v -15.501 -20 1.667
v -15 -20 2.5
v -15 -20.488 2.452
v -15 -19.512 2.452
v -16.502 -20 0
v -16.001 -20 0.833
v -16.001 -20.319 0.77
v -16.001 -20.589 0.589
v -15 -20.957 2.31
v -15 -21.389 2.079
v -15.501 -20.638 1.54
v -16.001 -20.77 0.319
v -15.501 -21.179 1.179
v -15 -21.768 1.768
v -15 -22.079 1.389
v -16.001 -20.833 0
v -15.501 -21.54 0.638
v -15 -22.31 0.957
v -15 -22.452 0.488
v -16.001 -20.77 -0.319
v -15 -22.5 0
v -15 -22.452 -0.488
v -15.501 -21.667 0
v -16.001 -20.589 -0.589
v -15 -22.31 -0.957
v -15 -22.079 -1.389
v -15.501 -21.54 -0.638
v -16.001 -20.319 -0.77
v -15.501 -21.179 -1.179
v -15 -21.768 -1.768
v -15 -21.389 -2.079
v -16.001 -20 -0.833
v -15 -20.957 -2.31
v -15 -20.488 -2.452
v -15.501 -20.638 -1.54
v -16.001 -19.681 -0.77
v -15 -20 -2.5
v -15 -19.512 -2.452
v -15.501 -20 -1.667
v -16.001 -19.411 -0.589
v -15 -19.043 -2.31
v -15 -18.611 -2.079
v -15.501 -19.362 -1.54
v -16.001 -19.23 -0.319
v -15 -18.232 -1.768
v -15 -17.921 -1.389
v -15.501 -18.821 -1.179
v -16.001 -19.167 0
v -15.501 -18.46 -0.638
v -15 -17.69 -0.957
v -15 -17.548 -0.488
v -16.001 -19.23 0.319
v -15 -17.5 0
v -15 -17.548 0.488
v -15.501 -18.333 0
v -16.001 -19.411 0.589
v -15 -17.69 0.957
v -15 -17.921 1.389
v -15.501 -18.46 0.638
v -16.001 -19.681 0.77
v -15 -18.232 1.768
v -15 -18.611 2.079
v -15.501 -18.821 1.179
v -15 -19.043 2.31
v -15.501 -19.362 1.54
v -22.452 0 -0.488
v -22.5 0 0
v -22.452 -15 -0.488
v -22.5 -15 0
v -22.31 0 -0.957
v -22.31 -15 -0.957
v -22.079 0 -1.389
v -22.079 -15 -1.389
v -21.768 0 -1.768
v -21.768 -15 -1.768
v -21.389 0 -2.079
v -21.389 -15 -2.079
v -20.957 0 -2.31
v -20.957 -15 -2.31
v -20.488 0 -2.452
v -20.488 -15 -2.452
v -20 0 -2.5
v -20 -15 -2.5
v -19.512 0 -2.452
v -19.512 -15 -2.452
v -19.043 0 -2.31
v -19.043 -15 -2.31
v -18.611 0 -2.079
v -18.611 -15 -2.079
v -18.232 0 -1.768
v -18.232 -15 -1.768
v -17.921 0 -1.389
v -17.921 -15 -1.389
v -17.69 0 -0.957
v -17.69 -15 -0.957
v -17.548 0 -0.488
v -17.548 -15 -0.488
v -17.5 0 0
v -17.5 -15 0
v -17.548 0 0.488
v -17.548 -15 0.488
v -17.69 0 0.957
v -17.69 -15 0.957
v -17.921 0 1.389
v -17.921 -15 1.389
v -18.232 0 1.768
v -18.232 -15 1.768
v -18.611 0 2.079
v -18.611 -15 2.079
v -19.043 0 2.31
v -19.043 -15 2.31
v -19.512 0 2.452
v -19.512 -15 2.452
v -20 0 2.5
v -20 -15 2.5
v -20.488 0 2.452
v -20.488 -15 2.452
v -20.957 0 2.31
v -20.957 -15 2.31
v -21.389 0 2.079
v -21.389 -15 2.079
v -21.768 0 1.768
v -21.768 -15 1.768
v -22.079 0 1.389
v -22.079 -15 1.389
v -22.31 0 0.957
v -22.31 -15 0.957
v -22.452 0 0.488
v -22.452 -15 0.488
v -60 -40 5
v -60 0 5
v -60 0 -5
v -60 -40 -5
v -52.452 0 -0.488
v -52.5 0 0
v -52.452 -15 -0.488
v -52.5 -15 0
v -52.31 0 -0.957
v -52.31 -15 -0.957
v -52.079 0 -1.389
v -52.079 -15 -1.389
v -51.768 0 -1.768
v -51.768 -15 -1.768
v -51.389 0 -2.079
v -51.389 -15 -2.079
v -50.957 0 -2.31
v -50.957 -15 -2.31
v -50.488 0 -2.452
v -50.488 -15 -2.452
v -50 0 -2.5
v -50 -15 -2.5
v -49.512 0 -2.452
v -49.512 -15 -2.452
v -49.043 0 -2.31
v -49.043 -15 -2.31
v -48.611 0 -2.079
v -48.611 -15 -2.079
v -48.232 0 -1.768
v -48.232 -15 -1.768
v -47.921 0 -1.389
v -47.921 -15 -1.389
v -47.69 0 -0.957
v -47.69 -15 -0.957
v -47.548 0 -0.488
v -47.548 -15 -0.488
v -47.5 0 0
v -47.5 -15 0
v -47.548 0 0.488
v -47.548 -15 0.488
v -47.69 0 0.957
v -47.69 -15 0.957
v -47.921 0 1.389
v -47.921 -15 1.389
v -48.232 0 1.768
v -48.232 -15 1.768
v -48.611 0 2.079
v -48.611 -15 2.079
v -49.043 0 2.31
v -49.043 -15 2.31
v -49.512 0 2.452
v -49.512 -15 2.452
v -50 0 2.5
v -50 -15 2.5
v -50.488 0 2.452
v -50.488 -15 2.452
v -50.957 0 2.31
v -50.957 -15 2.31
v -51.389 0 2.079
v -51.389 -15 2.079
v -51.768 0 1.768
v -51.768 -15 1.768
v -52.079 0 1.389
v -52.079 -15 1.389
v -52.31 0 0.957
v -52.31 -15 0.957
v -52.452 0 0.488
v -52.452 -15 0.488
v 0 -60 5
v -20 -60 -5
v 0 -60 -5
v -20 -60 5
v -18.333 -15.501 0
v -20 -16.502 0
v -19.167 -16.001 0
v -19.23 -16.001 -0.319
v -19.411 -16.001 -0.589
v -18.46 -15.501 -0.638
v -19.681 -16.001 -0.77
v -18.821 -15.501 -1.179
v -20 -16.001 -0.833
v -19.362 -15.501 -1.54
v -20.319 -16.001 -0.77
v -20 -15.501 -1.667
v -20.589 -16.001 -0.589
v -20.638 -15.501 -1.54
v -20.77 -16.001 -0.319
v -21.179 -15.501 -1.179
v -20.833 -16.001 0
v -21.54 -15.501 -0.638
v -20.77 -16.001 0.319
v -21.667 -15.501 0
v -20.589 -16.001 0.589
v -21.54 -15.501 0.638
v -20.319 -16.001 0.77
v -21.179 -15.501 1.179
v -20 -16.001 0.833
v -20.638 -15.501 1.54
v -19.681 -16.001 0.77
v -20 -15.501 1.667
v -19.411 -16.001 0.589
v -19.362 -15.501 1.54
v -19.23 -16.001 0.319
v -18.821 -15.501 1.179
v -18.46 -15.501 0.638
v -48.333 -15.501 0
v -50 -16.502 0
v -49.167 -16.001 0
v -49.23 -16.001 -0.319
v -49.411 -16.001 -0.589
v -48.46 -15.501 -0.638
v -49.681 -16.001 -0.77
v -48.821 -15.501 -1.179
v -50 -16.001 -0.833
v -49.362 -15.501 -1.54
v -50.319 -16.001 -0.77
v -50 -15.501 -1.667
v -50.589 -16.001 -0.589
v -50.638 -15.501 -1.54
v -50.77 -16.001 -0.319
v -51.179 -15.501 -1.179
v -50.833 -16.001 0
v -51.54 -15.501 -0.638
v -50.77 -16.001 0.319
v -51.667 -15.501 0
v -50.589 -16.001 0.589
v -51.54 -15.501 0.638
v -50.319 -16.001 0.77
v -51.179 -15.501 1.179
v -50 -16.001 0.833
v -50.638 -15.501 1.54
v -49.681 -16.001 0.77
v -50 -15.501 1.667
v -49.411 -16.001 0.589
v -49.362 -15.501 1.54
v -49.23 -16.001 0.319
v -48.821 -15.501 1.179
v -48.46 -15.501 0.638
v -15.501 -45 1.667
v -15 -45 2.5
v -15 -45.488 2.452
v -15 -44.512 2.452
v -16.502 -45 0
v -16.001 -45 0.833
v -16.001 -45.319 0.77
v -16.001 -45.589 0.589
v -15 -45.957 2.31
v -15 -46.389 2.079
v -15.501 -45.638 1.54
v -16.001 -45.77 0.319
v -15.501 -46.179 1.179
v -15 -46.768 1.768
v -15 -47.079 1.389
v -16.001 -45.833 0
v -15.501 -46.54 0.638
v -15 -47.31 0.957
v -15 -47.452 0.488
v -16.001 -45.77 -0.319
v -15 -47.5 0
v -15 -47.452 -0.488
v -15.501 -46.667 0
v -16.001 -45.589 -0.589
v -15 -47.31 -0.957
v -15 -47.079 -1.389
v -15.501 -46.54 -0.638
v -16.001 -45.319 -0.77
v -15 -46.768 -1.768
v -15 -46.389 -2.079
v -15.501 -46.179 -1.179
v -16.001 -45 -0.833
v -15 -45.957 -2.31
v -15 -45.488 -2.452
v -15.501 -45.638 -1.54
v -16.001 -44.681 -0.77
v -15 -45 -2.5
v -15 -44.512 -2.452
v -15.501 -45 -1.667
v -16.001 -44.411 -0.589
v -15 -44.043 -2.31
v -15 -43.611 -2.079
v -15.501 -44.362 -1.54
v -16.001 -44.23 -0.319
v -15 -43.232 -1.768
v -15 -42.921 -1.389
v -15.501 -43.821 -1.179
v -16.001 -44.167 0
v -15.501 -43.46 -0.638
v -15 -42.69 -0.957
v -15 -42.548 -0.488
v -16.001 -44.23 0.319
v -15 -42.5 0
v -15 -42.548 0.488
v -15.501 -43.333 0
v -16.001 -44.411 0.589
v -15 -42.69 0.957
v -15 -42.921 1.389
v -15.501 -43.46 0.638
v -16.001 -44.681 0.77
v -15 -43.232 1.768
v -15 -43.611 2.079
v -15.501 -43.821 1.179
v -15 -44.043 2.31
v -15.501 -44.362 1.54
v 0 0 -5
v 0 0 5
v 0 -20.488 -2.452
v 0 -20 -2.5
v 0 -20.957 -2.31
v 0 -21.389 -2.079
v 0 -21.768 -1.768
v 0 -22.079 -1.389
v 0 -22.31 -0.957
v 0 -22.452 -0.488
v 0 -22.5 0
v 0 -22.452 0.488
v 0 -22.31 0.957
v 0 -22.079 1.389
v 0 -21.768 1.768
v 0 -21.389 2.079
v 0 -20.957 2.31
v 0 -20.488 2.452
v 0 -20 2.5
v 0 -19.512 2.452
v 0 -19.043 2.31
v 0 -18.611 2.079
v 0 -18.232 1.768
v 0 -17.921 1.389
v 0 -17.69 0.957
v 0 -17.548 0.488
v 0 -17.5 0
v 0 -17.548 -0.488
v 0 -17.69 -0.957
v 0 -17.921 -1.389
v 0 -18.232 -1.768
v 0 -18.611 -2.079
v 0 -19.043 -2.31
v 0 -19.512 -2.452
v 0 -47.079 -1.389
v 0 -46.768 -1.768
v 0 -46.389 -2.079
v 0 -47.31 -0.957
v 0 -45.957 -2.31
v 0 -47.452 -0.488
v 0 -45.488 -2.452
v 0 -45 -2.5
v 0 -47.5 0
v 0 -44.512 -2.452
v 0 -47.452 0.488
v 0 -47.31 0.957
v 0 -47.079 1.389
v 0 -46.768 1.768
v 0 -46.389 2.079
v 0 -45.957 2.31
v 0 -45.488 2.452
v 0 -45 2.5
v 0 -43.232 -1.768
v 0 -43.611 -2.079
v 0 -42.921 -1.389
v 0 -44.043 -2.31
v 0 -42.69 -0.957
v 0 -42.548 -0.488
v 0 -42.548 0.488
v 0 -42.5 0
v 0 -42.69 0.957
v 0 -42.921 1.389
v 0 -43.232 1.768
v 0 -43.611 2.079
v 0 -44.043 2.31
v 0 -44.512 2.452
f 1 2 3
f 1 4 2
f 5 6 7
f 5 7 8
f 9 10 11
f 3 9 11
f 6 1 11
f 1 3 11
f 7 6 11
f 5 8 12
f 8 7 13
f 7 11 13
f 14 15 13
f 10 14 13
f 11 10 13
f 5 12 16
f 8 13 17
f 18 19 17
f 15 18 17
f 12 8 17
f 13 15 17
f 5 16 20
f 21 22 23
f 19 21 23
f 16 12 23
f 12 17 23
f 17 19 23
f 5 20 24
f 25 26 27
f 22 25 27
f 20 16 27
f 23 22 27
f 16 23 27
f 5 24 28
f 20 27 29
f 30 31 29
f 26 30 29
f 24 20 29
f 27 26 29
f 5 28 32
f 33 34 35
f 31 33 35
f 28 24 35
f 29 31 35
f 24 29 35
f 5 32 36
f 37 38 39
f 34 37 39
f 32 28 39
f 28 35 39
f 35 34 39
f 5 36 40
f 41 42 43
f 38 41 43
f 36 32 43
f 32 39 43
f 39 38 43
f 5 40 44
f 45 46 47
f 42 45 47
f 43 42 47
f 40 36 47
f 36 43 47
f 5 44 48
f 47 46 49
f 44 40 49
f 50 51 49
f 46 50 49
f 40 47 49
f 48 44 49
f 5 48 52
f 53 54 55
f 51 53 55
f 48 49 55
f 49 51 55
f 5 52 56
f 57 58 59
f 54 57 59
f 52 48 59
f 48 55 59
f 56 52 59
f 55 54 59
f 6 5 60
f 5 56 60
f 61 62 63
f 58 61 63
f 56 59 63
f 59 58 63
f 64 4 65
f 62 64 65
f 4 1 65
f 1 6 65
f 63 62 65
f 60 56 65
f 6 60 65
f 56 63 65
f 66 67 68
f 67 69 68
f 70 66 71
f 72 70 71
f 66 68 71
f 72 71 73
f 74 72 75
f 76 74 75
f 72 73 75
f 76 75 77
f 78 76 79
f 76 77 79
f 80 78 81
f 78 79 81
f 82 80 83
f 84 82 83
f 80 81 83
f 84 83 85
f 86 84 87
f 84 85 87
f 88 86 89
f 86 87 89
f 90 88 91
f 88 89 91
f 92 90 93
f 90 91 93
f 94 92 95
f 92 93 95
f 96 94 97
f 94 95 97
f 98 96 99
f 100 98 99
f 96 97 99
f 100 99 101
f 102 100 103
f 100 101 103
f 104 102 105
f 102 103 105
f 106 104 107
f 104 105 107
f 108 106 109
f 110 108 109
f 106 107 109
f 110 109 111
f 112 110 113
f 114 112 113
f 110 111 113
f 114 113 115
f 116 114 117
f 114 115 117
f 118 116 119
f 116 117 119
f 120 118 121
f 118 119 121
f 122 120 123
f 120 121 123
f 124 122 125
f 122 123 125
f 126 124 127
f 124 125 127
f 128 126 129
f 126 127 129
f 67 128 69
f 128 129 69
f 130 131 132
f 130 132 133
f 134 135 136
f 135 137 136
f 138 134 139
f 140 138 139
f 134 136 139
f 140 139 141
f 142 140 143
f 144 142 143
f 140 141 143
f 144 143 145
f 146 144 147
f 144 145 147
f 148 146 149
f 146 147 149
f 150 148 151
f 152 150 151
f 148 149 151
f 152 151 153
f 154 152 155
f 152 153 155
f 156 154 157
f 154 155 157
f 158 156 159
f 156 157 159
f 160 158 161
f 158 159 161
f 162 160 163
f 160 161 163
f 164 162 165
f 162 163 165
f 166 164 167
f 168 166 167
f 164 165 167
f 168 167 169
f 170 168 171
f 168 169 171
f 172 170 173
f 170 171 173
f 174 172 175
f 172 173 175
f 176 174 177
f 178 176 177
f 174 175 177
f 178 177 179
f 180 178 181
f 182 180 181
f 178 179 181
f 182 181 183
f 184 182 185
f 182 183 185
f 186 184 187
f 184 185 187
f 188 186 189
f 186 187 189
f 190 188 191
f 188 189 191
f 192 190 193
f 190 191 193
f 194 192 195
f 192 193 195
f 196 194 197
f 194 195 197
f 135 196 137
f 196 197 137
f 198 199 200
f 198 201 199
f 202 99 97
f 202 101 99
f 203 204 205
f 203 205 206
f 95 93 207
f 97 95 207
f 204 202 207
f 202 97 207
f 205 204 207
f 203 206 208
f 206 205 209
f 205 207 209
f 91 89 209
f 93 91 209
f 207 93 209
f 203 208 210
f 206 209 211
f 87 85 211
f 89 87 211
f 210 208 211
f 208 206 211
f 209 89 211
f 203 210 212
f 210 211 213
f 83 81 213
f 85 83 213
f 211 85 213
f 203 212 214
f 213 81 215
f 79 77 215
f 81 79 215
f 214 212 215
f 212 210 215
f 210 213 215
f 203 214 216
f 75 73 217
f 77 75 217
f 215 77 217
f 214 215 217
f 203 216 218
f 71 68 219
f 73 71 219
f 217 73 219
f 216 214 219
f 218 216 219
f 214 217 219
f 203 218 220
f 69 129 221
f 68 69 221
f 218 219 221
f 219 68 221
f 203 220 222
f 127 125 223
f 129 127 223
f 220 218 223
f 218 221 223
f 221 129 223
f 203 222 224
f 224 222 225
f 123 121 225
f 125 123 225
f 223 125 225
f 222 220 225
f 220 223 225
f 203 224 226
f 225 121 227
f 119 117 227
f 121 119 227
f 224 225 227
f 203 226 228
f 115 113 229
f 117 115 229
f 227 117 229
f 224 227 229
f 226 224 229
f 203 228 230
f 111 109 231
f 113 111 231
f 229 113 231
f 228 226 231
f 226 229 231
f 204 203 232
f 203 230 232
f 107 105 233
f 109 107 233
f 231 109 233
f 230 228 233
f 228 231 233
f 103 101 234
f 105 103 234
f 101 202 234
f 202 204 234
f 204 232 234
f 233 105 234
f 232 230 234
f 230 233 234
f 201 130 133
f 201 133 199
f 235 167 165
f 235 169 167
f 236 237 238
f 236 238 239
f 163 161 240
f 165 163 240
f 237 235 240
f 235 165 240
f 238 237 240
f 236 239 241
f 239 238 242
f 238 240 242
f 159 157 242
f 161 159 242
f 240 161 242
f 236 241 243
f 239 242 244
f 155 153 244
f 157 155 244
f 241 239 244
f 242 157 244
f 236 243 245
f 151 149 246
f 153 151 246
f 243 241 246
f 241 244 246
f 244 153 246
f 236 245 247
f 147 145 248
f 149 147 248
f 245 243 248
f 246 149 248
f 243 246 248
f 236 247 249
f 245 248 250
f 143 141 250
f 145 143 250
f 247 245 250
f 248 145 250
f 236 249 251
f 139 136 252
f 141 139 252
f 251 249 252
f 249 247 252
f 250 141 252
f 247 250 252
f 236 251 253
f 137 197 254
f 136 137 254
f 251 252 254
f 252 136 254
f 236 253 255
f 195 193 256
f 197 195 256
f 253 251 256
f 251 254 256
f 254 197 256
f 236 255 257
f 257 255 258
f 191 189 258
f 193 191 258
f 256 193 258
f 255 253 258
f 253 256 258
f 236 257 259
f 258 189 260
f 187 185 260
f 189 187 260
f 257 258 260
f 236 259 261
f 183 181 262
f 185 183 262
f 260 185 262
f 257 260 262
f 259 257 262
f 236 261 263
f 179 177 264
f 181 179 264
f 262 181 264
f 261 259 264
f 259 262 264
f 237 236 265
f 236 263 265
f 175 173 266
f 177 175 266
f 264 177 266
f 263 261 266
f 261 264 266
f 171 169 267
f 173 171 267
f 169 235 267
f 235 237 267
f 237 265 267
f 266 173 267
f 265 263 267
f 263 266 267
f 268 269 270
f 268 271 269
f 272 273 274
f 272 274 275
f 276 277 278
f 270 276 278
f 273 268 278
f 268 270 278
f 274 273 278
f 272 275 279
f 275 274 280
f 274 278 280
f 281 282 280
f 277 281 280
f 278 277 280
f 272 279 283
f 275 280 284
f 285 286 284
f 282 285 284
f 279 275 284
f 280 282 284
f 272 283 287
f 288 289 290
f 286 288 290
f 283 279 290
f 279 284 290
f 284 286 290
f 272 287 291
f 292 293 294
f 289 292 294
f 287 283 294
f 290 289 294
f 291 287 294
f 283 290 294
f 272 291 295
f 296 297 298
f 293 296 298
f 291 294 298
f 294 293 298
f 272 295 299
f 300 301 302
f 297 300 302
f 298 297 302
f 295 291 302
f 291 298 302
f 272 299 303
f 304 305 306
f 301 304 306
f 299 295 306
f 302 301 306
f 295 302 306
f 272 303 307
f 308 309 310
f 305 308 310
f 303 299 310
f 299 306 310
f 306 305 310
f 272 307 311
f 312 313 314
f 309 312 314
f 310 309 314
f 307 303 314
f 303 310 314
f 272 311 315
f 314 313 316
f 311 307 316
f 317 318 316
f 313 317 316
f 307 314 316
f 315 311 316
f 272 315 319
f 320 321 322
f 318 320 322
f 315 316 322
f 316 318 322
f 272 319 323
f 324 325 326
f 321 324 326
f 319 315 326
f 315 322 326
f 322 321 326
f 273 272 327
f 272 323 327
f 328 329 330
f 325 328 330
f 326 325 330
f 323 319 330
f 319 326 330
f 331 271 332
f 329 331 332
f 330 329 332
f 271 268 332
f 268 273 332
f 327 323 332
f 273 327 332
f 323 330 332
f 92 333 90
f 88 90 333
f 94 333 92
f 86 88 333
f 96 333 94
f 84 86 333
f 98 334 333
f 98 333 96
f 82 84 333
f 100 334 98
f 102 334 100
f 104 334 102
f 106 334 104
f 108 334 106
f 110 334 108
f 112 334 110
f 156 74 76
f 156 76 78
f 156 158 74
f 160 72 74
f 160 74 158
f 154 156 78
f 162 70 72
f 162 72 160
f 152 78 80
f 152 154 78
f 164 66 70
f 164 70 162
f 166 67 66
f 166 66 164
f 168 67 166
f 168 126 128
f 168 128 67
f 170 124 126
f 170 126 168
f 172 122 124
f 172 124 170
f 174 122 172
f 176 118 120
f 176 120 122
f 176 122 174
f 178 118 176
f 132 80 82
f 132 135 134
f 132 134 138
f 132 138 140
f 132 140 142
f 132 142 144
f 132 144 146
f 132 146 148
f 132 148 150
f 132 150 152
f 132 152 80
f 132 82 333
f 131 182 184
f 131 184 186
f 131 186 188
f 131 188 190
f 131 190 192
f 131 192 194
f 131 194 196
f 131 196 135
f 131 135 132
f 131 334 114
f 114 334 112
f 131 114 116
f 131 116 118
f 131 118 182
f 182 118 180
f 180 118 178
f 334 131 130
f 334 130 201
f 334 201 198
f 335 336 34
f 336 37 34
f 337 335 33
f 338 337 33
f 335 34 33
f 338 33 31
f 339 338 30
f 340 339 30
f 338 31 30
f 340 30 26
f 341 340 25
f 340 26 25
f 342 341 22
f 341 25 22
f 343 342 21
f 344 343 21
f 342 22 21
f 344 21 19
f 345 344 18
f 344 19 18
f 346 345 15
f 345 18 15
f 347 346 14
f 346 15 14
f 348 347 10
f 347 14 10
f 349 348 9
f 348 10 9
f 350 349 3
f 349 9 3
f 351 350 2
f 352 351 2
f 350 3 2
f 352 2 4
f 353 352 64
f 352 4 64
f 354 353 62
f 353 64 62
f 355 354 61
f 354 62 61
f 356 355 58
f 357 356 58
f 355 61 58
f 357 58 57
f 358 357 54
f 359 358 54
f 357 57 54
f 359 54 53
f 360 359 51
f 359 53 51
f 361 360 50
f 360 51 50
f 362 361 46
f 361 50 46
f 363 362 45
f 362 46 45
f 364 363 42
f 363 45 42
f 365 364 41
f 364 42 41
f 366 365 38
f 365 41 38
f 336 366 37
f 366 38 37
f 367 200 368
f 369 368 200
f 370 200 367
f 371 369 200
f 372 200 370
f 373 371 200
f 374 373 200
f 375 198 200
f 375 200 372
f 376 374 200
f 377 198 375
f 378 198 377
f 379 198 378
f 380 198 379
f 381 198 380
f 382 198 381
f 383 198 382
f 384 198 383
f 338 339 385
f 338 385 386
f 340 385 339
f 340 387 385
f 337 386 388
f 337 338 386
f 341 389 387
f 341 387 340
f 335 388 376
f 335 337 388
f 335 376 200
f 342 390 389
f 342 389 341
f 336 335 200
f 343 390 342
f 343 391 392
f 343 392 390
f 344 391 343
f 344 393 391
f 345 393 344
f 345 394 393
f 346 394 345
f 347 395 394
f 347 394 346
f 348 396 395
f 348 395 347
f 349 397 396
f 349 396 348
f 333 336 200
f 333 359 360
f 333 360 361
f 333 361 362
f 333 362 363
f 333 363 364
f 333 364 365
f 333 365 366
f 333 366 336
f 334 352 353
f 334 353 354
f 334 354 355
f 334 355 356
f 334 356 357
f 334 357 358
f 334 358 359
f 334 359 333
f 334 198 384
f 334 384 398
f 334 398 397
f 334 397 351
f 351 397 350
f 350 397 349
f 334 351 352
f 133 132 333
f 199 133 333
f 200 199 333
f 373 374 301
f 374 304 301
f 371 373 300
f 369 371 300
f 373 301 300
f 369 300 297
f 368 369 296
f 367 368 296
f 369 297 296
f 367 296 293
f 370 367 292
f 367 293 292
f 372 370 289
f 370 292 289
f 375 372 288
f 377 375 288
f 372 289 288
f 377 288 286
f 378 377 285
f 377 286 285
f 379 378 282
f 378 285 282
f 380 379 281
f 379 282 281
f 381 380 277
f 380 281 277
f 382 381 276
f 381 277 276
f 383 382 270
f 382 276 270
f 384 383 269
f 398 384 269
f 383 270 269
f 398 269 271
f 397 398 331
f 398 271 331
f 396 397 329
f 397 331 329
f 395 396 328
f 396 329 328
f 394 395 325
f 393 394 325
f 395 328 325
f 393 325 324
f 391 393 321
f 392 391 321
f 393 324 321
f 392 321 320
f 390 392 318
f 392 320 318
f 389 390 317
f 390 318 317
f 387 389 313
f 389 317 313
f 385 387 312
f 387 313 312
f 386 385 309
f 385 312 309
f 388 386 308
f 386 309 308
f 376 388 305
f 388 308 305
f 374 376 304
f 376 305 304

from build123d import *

# Parameters (mm, degrees)
EXTRUDE_1_DEPTH        = 5
HOLE_WIZARD_M6_1_D     = 5
HOLE_WIZARD_M6_1_DEPTH = 15
HOLE_WIZARD_M6_1_TIP   = 1.502151548
HOLE_WIZARD_M6_2_D     = 5
HOLE_WIZARD_M6_2_DEPTH = 15
HOLE_WIZARD_M6_2_TIP   = 1.502151548


with BuildPart() as part:
    # 草图1 → 凸台-拉伸1 (new body, symmetric)
    with BuildSketch(Plane.XY):
        Polygon((0, 0), (-60, 0), (-60, -40), (-20, -60), (0, -60), align=None)
    extrude(amount=EXTRUDE_1_DEPTH, both=True)

    # M6 螺纹孔1
    with Locations(Plane(origin=(0, -20, 0), x_dir=(0, 0, 1), z_dir=(1, 0, 0))):
        with Locations((0, 0), (0, 25)):
            Hole(HOLE_WIZARD_M6_1_D / 2, depth=HOLE_WIZARD_M6_1_DEPTH)
            with Locations((0, 0, -(HOLE_WIZARD_M6_1_DEPTH + HOLE_WIZARD_M6_1_TIP / 2))):  # 118° drill point
                Cone(0, HOLE_WIZARD_M6_1_D / 2, HOLE_WIZARD_M6_1_TIP, mode=Mode.SUBTRACT)

    # M6 螺纹孔2
    with Locations(Plane(origin=(-20, 0, 0), x_dir=(1, 0, 0), z_dir=(0, 1, 0))):
        with Locations((0, 0), (-30, 0)):
            Hole(HOLE_WIZARD_M6_2_D / 2, depth=HOLE_WIZARD_M6_2_DEPTH)
            with Locations((0, 0, -(HOLE_WIZARD_M6_2_DEPTH + HOLE_WIZARD_M6_2_TIP / 2))):  # 118° drill point
                Cone(0, HOLE_WIZARD_M6_2_D / 2, HOLE_WIZARD_M6_2_TIP, mode=Mode.SUBTRACT)


solid = part.part
